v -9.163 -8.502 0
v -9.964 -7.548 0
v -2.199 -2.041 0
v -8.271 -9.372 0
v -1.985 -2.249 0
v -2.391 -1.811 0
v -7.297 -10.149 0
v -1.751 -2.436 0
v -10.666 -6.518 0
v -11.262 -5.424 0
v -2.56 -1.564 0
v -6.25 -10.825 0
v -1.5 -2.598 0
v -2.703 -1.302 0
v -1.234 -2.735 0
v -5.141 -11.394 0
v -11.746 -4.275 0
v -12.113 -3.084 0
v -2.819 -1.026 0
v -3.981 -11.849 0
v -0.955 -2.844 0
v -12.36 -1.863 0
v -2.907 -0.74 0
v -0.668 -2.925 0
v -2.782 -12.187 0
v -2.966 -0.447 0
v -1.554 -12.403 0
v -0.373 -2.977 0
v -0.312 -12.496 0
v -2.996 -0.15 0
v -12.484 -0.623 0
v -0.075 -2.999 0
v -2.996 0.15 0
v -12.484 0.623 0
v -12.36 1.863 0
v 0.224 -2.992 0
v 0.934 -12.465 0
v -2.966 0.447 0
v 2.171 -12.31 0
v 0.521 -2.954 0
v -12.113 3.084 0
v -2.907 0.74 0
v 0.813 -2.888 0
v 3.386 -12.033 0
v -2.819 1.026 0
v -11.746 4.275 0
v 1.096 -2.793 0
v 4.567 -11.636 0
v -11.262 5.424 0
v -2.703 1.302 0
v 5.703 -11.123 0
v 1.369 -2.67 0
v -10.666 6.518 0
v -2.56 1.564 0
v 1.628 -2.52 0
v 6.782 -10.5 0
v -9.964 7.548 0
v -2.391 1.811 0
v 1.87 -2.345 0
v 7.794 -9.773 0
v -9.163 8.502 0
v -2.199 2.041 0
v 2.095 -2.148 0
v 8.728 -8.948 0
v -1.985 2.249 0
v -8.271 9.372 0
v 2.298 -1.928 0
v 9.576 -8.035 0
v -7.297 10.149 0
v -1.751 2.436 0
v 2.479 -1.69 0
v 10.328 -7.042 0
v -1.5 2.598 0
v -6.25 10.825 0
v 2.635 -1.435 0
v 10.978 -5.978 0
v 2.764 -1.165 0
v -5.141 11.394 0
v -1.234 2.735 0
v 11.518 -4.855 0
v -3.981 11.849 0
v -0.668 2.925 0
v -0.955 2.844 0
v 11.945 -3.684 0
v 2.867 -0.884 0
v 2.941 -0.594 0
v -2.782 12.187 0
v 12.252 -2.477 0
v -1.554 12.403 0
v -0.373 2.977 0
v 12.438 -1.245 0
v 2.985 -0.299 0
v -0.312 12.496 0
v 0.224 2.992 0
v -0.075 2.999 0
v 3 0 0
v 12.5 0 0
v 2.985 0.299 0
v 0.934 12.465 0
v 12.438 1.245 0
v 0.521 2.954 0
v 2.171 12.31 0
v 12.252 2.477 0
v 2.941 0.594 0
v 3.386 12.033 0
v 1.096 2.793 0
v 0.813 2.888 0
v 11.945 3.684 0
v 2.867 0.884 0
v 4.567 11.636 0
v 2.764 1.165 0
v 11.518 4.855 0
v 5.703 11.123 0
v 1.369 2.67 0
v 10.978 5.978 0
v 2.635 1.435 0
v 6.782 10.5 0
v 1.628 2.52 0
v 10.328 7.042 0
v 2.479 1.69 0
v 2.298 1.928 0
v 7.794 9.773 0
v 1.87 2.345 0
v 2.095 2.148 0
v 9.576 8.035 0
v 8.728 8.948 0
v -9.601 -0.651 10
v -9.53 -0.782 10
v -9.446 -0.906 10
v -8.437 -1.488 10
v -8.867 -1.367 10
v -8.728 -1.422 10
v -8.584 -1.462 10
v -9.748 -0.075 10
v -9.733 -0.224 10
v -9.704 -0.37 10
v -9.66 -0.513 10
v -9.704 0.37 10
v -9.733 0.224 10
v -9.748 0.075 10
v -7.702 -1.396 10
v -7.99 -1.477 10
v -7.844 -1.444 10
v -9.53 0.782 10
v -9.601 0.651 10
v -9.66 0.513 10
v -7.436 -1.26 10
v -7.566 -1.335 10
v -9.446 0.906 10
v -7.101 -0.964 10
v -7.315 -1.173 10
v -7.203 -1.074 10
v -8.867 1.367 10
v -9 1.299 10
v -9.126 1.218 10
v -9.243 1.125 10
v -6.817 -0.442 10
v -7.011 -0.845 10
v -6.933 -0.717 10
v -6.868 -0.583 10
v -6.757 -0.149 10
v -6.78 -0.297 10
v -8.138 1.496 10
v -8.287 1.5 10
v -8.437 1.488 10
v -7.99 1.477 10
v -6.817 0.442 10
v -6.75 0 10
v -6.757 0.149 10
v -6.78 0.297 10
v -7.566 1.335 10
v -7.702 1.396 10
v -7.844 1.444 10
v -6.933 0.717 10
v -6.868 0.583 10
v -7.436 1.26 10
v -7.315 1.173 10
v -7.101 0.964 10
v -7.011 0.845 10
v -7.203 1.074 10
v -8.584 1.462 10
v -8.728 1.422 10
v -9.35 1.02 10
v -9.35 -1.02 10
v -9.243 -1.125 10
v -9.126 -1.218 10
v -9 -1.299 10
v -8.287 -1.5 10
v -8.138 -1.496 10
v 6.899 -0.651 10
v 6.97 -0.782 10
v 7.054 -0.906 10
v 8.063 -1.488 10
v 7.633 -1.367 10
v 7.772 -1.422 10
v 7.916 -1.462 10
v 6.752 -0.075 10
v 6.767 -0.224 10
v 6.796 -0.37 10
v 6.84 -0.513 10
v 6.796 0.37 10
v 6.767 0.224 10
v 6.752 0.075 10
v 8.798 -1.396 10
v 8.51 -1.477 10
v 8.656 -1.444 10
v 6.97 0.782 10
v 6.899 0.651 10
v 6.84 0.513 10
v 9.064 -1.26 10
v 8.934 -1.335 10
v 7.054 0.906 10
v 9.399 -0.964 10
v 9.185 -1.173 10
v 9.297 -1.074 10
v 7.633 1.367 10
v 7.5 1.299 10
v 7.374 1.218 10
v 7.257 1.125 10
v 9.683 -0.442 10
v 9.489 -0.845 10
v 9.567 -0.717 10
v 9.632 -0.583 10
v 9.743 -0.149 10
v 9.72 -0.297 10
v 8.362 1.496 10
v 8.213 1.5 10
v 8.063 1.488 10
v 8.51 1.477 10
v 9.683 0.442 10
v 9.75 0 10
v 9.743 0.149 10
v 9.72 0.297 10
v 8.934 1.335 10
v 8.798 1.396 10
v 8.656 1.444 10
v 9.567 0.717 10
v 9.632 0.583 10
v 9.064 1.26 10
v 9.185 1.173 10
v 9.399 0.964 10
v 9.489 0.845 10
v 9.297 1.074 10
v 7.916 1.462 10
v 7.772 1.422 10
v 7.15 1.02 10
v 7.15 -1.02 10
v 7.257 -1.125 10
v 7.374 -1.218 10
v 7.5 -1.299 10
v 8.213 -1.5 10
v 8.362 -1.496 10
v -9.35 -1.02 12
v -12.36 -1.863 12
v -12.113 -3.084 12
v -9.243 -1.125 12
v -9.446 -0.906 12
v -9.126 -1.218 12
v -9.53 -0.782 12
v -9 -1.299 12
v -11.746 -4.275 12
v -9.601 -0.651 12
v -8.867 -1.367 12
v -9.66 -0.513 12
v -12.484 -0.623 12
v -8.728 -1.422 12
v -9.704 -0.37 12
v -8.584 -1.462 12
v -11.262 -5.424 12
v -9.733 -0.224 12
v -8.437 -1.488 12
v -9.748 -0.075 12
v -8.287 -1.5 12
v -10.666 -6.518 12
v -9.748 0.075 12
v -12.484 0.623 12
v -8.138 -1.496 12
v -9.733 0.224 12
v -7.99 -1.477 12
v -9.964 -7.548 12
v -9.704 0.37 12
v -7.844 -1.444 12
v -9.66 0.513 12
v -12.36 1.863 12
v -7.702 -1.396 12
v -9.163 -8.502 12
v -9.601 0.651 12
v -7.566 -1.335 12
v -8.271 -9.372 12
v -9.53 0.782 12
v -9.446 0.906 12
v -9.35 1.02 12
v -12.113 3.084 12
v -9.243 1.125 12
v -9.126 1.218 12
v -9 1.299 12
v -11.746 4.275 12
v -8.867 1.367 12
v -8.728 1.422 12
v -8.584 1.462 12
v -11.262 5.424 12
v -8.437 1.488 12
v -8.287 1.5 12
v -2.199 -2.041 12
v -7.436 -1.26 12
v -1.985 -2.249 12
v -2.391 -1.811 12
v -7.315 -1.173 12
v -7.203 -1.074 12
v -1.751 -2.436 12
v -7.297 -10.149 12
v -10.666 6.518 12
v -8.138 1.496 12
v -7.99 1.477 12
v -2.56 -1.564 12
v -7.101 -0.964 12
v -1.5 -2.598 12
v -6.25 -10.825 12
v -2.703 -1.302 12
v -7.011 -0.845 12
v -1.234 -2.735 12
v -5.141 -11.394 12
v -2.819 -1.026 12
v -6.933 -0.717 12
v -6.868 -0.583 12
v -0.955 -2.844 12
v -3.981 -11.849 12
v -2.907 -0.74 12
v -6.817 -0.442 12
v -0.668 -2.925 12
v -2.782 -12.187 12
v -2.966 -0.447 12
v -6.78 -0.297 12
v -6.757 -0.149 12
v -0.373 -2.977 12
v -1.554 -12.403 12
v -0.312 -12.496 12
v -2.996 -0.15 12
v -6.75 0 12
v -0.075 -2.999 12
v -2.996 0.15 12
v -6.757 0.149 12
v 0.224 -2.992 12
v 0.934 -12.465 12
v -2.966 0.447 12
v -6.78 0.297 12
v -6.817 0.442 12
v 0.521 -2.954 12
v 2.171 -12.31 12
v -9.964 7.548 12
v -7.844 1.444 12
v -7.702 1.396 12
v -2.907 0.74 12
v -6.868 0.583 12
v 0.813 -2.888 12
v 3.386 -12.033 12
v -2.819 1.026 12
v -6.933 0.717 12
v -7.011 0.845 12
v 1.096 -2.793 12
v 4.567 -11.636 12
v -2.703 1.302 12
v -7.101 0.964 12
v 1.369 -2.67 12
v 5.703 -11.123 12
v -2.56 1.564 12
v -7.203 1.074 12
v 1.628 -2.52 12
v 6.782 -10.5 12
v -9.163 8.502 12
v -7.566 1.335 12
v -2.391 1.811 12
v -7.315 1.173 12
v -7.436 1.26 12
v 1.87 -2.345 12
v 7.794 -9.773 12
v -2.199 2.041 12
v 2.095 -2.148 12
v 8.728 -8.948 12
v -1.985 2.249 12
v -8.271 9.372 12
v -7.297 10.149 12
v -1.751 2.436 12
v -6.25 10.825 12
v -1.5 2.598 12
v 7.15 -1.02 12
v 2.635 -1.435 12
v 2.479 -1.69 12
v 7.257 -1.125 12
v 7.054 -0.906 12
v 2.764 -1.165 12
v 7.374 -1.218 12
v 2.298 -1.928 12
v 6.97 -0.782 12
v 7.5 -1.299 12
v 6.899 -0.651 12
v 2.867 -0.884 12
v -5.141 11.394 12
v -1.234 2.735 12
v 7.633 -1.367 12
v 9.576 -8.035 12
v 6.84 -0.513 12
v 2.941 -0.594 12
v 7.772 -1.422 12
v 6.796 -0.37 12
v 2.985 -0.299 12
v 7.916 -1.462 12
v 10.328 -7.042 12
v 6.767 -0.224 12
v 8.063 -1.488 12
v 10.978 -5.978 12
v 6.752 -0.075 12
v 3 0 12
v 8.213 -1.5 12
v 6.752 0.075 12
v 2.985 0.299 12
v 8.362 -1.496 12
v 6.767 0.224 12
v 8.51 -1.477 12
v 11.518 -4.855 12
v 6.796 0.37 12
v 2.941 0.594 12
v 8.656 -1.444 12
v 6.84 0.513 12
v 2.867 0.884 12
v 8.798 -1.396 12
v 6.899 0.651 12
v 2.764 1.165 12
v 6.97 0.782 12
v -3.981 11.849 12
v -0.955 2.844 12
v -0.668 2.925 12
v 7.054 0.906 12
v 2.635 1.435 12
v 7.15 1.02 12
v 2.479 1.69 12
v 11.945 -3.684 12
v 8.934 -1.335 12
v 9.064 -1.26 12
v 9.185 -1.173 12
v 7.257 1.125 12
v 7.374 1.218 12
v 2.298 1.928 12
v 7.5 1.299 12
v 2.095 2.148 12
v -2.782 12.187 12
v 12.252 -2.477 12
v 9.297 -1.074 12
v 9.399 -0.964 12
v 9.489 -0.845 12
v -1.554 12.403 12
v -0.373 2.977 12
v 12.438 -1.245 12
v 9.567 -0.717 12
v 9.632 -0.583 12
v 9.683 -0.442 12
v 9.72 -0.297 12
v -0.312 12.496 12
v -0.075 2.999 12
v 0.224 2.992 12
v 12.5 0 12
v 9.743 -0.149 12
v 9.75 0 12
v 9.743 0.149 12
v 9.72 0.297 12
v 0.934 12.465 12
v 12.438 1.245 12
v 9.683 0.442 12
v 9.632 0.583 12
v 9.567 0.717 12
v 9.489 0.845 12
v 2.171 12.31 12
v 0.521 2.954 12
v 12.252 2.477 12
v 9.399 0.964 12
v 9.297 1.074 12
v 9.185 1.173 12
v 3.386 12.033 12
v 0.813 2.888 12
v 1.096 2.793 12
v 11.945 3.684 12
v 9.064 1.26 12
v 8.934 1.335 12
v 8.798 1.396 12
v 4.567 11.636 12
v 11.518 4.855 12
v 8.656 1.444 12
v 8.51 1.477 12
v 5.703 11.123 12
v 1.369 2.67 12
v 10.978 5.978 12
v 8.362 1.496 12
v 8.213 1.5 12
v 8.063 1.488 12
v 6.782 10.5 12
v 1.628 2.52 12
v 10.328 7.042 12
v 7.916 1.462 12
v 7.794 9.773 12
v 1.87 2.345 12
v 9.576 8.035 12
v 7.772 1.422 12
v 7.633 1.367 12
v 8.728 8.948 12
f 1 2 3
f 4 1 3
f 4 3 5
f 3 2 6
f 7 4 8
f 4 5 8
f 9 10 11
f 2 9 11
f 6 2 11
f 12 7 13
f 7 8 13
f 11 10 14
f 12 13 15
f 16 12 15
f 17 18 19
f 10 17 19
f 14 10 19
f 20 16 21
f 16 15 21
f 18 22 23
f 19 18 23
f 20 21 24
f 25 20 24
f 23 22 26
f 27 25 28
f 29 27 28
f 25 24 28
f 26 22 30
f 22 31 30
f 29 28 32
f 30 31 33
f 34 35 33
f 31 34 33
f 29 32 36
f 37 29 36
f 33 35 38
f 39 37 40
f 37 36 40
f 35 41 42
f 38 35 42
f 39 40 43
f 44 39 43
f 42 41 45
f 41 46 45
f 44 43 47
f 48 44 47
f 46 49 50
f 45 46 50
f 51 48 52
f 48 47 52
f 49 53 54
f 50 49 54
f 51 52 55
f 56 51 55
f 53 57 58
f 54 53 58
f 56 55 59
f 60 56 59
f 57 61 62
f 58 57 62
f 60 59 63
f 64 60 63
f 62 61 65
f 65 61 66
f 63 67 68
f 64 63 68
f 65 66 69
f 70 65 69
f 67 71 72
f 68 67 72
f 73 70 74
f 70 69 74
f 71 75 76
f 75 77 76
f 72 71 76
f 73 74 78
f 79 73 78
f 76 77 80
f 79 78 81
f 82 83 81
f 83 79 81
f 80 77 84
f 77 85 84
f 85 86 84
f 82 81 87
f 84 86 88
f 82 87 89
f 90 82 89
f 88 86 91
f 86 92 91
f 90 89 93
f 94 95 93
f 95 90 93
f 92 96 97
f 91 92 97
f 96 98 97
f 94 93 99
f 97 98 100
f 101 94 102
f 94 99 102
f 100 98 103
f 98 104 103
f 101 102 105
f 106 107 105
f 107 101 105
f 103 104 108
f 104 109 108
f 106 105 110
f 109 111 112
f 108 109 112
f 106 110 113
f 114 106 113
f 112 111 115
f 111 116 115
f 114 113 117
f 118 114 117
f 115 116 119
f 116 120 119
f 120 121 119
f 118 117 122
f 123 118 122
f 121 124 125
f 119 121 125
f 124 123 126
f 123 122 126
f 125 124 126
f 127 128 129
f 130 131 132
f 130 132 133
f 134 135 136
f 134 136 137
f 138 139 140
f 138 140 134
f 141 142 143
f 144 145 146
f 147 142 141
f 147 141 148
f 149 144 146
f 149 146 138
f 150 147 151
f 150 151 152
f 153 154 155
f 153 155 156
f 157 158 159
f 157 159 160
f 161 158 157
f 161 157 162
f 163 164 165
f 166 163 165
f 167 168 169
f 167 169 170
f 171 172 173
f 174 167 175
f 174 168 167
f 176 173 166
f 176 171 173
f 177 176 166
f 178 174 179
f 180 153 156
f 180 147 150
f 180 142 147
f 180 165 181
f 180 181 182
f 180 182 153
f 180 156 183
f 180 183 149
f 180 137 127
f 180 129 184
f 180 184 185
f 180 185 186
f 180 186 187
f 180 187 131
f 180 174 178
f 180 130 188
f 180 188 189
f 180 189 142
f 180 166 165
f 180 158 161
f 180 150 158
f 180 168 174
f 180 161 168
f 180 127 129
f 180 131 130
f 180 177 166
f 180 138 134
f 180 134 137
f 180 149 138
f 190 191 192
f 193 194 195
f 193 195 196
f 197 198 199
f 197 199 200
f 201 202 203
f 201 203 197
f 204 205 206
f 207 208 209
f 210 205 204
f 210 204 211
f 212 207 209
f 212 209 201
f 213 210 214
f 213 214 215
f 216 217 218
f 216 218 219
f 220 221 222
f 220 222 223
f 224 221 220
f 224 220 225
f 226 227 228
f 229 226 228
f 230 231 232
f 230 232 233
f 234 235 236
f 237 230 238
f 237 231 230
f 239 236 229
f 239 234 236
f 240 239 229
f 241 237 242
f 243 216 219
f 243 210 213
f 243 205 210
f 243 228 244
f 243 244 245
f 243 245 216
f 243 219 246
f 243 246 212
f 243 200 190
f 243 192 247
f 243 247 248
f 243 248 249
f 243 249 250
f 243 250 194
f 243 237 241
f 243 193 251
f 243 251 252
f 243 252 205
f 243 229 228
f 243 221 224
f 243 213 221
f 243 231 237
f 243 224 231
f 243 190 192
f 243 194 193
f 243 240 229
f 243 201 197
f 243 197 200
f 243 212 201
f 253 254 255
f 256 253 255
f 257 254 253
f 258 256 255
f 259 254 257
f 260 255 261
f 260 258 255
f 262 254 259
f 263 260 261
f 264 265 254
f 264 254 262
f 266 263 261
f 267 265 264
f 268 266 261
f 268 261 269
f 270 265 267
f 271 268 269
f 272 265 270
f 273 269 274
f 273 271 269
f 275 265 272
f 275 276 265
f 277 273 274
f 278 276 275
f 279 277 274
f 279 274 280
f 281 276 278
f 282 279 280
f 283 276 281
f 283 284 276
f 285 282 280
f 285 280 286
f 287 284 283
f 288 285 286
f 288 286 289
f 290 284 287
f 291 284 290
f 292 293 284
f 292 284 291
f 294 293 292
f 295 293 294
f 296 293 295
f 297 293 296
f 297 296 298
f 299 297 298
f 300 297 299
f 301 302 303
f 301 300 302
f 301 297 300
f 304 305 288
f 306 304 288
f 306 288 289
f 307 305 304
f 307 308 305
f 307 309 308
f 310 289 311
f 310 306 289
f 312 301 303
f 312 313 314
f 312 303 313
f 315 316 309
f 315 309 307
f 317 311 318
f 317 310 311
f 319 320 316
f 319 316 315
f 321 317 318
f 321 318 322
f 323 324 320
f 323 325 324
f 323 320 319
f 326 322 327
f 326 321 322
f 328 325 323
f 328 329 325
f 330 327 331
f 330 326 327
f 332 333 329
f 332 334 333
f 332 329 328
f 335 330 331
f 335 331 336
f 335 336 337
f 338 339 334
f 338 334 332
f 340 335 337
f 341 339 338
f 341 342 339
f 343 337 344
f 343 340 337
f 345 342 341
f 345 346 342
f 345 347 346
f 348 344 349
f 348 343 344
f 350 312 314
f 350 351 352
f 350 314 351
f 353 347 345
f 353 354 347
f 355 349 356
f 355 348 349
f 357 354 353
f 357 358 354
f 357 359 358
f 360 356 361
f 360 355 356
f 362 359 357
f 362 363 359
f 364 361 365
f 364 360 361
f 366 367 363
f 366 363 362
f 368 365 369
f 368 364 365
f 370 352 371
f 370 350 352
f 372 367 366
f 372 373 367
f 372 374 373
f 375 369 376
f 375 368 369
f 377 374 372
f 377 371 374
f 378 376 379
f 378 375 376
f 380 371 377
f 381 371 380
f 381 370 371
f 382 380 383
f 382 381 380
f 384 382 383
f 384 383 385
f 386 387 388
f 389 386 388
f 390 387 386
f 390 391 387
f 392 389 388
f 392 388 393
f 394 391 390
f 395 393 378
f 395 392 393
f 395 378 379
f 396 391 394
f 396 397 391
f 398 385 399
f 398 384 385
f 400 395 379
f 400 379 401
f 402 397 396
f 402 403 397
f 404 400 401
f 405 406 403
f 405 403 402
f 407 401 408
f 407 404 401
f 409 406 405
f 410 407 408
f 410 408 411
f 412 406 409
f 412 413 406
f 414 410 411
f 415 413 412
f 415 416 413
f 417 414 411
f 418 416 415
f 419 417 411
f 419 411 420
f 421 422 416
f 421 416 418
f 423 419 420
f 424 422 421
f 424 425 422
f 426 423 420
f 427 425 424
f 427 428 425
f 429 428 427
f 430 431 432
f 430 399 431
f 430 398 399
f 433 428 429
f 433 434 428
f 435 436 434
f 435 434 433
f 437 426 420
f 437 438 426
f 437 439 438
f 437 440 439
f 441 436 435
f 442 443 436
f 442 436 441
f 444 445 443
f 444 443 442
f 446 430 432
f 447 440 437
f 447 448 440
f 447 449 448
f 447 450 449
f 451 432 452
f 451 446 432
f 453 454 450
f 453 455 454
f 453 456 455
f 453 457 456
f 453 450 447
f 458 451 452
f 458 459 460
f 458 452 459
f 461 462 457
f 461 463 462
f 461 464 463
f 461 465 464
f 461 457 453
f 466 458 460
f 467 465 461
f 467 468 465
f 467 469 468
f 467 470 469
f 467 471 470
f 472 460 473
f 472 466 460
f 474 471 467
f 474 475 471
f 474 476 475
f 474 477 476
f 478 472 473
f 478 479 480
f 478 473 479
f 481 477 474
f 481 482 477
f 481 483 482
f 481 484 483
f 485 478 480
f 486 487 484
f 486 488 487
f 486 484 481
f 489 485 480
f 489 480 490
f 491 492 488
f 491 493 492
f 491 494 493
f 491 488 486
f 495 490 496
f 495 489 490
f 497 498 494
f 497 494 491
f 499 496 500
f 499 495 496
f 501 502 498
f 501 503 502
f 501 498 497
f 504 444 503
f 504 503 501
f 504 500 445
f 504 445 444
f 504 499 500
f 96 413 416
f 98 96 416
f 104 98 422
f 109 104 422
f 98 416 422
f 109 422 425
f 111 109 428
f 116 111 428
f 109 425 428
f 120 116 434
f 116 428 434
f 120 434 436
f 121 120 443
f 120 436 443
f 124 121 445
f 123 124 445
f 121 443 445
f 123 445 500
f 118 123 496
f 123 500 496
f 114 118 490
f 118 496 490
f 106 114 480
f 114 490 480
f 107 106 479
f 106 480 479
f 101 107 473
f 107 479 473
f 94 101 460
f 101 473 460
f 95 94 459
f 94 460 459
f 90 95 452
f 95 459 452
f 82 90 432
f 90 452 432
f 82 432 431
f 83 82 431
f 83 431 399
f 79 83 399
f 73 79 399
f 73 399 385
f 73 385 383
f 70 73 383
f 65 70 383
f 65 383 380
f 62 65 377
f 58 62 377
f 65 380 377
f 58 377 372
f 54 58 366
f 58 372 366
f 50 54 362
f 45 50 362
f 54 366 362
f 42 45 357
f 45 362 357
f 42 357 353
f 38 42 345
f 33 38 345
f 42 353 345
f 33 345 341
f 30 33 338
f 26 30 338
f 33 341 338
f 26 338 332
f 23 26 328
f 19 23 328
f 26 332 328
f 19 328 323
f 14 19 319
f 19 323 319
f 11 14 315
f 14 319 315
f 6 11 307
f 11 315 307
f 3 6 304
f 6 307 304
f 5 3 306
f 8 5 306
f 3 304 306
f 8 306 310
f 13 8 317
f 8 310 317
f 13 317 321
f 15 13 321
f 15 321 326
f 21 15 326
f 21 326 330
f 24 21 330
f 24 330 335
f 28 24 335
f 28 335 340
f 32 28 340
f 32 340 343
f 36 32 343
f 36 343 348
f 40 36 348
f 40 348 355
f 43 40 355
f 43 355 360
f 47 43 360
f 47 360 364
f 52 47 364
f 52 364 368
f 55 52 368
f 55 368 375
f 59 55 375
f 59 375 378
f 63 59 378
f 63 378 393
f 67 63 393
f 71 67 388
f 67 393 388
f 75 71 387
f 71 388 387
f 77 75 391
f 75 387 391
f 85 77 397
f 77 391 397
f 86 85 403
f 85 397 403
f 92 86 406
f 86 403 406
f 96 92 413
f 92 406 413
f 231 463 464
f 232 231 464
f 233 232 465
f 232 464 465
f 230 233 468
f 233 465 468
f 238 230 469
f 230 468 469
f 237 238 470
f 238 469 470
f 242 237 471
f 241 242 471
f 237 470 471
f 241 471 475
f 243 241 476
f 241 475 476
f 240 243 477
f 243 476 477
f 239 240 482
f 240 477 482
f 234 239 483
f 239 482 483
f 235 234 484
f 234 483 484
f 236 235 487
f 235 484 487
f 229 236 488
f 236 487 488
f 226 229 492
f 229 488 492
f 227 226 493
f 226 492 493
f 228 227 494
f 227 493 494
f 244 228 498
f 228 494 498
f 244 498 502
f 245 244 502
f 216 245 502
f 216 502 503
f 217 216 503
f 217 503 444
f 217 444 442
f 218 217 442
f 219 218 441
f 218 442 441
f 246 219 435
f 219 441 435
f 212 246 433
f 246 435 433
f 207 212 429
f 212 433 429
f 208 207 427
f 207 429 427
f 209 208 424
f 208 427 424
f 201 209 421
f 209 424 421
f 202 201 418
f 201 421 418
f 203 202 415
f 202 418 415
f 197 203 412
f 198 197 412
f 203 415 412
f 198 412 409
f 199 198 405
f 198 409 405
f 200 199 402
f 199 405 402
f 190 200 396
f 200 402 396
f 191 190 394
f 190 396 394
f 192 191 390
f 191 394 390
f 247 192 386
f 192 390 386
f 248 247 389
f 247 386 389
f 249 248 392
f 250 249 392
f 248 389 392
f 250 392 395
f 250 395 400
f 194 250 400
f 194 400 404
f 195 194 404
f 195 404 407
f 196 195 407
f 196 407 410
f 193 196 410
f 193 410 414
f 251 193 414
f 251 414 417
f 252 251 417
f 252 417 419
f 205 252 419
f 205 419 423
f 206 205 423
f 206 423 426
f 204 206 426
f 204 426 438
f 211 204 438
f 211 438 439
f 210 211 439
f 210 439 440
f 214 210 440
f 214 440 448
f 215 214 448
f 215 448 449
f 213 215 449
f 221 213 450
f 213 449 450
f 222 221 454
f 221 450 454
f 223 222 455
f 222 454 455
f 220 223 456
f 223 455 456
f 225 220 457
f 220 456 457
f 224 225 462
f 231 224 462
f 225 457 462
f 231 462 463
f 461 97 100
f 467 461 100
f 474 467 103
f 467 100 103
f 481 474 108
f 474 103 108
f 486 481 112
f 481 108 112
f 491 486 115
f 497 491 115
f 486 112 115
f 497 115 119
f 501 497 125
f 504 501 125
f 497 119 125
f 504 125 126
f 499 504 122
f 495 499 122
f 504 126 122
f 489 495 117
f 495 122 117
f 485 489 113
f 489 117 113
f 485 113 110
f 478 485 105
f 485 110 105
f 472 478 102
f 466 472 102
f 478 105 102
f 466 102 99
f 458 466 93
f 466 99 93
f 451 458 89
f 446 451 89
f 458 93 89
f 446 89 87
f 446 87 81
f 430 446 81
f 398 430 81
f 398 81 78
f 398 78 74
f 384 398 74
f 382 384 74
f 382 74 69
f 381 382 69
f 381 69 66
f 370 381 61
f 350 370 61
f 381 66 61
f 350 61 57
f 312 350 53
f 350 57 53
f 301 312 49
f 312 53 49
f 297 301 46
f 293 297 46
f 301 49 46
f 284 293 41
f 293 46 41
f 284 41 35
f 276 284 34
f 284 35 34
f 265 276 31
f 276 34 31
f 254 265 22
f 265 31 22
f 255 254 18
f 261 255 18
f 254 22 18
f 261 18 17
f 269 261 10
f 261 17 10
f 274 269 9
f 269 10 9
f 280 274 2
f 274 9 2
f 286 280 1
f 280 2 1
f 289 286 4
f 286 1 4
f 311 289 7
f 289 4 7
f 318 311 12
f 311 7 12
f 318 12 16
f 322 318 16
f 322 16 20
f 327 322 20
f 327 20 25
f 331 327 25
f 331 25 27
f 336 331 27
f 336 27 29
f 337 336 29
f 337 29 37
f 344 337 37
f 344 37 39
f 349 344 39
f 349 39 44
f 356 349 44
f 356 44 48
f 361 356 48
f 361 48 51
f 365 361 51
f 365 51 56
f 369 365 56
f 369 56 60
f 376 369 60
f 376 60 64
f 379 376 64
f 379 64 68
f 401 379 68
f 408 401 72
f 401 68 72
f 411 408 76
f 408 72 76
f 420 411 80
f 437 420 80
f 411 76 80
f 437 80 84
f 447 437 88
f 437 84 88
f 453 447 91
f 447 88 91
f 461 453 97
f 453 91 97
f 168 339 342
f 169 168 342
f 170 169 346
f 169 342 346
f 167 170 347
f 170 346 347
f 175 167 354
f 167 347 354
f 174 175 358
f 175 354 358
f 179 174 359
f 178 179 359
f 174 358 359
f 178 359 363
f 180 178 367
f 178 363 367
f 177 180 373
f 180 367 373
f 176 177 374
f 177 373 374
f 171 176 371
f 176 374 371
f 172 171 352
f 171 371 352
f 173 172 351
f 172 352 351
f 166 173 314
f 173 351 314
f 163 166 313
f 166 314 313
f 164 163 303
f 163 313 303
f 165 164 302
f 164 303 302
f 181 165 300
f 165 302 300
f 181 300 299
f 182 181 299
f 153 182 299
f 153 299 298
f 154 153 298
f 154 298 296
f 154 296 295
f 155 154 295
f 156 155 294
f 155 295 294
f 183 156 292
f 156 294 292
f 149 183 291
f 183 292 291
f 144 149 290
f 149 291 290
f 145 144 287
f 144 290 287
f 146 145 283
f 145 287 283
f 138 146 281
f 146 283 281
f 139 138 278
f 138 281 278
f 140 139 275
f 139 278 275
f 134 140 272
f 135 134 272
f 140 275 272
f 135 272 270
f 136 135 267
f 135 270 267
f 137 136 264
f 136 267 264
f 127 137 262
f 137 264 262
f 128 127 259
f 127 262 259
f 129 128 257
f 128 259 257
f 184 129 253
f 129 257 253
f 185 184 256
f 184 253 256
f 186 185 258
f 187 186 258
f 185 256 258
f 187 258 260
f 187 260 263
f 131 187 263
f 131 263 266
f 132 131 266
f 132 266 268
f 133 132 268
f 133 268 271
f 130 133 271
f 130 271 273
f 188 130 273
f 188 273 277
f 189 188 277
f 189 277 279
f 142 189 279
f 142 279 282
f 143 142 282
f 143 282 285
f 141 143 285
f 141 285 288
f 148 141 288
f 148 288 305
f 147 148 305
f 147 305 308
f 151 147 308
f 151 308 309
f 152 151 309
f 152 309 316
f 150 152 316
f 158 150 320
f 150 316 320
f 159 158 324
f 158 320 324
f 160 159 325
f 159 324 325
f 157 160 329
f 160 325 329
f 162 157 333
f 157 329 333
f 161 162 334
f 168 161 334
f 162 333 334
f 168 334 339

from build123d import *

# Parameters (mm, degrees)
ESQUISSE1_R             = 12.5
BOSS_EXTRU_1_DEPTH      = 12
ESQUISSE2_R             = 3
ENL_V_MAT_EXTRU_1_DEPTH = 12
ESQUISSE3_R             = 1.5
ENL_V_MAT_EXTRU_2_DEPTH = 2


with BuildPart() as part:
    # Esquisse1 → Boss.-Extru.1 (new body)
    with BuildSketch(Plane.XY):
        Circle(ESQUISSE1_R)
    extrude(amount=BOSS_EXTRU_1_DEPTH)

    # Esquisse2 → Enlèv. mat.-Extru.1 (cut)
    with BuildSketch(Plane.XY.offset(12)):
        Circle(ESQUISSE2_R)
    extrude(amount=-ENL_V_MAT_EXTRU_1_DEPTH, mode=Mode.SUBTRACT)

    # Esquisse3 → Enlèv. mat.-Extru.2 (cut)
    with BuildSketch(Plane.XY.offset(12)):
        with Locations((-8.25, 0)):
            Circle(ESQUISSE3_R)
        with Locations((8.25, 0)):
            Circle(ESQUISSE3_R)
    extrude(amount=-ENL_V_MAT_EXTRU_2_DEPTH, mode=Mode.SUBTRACT)


solid = part.part
